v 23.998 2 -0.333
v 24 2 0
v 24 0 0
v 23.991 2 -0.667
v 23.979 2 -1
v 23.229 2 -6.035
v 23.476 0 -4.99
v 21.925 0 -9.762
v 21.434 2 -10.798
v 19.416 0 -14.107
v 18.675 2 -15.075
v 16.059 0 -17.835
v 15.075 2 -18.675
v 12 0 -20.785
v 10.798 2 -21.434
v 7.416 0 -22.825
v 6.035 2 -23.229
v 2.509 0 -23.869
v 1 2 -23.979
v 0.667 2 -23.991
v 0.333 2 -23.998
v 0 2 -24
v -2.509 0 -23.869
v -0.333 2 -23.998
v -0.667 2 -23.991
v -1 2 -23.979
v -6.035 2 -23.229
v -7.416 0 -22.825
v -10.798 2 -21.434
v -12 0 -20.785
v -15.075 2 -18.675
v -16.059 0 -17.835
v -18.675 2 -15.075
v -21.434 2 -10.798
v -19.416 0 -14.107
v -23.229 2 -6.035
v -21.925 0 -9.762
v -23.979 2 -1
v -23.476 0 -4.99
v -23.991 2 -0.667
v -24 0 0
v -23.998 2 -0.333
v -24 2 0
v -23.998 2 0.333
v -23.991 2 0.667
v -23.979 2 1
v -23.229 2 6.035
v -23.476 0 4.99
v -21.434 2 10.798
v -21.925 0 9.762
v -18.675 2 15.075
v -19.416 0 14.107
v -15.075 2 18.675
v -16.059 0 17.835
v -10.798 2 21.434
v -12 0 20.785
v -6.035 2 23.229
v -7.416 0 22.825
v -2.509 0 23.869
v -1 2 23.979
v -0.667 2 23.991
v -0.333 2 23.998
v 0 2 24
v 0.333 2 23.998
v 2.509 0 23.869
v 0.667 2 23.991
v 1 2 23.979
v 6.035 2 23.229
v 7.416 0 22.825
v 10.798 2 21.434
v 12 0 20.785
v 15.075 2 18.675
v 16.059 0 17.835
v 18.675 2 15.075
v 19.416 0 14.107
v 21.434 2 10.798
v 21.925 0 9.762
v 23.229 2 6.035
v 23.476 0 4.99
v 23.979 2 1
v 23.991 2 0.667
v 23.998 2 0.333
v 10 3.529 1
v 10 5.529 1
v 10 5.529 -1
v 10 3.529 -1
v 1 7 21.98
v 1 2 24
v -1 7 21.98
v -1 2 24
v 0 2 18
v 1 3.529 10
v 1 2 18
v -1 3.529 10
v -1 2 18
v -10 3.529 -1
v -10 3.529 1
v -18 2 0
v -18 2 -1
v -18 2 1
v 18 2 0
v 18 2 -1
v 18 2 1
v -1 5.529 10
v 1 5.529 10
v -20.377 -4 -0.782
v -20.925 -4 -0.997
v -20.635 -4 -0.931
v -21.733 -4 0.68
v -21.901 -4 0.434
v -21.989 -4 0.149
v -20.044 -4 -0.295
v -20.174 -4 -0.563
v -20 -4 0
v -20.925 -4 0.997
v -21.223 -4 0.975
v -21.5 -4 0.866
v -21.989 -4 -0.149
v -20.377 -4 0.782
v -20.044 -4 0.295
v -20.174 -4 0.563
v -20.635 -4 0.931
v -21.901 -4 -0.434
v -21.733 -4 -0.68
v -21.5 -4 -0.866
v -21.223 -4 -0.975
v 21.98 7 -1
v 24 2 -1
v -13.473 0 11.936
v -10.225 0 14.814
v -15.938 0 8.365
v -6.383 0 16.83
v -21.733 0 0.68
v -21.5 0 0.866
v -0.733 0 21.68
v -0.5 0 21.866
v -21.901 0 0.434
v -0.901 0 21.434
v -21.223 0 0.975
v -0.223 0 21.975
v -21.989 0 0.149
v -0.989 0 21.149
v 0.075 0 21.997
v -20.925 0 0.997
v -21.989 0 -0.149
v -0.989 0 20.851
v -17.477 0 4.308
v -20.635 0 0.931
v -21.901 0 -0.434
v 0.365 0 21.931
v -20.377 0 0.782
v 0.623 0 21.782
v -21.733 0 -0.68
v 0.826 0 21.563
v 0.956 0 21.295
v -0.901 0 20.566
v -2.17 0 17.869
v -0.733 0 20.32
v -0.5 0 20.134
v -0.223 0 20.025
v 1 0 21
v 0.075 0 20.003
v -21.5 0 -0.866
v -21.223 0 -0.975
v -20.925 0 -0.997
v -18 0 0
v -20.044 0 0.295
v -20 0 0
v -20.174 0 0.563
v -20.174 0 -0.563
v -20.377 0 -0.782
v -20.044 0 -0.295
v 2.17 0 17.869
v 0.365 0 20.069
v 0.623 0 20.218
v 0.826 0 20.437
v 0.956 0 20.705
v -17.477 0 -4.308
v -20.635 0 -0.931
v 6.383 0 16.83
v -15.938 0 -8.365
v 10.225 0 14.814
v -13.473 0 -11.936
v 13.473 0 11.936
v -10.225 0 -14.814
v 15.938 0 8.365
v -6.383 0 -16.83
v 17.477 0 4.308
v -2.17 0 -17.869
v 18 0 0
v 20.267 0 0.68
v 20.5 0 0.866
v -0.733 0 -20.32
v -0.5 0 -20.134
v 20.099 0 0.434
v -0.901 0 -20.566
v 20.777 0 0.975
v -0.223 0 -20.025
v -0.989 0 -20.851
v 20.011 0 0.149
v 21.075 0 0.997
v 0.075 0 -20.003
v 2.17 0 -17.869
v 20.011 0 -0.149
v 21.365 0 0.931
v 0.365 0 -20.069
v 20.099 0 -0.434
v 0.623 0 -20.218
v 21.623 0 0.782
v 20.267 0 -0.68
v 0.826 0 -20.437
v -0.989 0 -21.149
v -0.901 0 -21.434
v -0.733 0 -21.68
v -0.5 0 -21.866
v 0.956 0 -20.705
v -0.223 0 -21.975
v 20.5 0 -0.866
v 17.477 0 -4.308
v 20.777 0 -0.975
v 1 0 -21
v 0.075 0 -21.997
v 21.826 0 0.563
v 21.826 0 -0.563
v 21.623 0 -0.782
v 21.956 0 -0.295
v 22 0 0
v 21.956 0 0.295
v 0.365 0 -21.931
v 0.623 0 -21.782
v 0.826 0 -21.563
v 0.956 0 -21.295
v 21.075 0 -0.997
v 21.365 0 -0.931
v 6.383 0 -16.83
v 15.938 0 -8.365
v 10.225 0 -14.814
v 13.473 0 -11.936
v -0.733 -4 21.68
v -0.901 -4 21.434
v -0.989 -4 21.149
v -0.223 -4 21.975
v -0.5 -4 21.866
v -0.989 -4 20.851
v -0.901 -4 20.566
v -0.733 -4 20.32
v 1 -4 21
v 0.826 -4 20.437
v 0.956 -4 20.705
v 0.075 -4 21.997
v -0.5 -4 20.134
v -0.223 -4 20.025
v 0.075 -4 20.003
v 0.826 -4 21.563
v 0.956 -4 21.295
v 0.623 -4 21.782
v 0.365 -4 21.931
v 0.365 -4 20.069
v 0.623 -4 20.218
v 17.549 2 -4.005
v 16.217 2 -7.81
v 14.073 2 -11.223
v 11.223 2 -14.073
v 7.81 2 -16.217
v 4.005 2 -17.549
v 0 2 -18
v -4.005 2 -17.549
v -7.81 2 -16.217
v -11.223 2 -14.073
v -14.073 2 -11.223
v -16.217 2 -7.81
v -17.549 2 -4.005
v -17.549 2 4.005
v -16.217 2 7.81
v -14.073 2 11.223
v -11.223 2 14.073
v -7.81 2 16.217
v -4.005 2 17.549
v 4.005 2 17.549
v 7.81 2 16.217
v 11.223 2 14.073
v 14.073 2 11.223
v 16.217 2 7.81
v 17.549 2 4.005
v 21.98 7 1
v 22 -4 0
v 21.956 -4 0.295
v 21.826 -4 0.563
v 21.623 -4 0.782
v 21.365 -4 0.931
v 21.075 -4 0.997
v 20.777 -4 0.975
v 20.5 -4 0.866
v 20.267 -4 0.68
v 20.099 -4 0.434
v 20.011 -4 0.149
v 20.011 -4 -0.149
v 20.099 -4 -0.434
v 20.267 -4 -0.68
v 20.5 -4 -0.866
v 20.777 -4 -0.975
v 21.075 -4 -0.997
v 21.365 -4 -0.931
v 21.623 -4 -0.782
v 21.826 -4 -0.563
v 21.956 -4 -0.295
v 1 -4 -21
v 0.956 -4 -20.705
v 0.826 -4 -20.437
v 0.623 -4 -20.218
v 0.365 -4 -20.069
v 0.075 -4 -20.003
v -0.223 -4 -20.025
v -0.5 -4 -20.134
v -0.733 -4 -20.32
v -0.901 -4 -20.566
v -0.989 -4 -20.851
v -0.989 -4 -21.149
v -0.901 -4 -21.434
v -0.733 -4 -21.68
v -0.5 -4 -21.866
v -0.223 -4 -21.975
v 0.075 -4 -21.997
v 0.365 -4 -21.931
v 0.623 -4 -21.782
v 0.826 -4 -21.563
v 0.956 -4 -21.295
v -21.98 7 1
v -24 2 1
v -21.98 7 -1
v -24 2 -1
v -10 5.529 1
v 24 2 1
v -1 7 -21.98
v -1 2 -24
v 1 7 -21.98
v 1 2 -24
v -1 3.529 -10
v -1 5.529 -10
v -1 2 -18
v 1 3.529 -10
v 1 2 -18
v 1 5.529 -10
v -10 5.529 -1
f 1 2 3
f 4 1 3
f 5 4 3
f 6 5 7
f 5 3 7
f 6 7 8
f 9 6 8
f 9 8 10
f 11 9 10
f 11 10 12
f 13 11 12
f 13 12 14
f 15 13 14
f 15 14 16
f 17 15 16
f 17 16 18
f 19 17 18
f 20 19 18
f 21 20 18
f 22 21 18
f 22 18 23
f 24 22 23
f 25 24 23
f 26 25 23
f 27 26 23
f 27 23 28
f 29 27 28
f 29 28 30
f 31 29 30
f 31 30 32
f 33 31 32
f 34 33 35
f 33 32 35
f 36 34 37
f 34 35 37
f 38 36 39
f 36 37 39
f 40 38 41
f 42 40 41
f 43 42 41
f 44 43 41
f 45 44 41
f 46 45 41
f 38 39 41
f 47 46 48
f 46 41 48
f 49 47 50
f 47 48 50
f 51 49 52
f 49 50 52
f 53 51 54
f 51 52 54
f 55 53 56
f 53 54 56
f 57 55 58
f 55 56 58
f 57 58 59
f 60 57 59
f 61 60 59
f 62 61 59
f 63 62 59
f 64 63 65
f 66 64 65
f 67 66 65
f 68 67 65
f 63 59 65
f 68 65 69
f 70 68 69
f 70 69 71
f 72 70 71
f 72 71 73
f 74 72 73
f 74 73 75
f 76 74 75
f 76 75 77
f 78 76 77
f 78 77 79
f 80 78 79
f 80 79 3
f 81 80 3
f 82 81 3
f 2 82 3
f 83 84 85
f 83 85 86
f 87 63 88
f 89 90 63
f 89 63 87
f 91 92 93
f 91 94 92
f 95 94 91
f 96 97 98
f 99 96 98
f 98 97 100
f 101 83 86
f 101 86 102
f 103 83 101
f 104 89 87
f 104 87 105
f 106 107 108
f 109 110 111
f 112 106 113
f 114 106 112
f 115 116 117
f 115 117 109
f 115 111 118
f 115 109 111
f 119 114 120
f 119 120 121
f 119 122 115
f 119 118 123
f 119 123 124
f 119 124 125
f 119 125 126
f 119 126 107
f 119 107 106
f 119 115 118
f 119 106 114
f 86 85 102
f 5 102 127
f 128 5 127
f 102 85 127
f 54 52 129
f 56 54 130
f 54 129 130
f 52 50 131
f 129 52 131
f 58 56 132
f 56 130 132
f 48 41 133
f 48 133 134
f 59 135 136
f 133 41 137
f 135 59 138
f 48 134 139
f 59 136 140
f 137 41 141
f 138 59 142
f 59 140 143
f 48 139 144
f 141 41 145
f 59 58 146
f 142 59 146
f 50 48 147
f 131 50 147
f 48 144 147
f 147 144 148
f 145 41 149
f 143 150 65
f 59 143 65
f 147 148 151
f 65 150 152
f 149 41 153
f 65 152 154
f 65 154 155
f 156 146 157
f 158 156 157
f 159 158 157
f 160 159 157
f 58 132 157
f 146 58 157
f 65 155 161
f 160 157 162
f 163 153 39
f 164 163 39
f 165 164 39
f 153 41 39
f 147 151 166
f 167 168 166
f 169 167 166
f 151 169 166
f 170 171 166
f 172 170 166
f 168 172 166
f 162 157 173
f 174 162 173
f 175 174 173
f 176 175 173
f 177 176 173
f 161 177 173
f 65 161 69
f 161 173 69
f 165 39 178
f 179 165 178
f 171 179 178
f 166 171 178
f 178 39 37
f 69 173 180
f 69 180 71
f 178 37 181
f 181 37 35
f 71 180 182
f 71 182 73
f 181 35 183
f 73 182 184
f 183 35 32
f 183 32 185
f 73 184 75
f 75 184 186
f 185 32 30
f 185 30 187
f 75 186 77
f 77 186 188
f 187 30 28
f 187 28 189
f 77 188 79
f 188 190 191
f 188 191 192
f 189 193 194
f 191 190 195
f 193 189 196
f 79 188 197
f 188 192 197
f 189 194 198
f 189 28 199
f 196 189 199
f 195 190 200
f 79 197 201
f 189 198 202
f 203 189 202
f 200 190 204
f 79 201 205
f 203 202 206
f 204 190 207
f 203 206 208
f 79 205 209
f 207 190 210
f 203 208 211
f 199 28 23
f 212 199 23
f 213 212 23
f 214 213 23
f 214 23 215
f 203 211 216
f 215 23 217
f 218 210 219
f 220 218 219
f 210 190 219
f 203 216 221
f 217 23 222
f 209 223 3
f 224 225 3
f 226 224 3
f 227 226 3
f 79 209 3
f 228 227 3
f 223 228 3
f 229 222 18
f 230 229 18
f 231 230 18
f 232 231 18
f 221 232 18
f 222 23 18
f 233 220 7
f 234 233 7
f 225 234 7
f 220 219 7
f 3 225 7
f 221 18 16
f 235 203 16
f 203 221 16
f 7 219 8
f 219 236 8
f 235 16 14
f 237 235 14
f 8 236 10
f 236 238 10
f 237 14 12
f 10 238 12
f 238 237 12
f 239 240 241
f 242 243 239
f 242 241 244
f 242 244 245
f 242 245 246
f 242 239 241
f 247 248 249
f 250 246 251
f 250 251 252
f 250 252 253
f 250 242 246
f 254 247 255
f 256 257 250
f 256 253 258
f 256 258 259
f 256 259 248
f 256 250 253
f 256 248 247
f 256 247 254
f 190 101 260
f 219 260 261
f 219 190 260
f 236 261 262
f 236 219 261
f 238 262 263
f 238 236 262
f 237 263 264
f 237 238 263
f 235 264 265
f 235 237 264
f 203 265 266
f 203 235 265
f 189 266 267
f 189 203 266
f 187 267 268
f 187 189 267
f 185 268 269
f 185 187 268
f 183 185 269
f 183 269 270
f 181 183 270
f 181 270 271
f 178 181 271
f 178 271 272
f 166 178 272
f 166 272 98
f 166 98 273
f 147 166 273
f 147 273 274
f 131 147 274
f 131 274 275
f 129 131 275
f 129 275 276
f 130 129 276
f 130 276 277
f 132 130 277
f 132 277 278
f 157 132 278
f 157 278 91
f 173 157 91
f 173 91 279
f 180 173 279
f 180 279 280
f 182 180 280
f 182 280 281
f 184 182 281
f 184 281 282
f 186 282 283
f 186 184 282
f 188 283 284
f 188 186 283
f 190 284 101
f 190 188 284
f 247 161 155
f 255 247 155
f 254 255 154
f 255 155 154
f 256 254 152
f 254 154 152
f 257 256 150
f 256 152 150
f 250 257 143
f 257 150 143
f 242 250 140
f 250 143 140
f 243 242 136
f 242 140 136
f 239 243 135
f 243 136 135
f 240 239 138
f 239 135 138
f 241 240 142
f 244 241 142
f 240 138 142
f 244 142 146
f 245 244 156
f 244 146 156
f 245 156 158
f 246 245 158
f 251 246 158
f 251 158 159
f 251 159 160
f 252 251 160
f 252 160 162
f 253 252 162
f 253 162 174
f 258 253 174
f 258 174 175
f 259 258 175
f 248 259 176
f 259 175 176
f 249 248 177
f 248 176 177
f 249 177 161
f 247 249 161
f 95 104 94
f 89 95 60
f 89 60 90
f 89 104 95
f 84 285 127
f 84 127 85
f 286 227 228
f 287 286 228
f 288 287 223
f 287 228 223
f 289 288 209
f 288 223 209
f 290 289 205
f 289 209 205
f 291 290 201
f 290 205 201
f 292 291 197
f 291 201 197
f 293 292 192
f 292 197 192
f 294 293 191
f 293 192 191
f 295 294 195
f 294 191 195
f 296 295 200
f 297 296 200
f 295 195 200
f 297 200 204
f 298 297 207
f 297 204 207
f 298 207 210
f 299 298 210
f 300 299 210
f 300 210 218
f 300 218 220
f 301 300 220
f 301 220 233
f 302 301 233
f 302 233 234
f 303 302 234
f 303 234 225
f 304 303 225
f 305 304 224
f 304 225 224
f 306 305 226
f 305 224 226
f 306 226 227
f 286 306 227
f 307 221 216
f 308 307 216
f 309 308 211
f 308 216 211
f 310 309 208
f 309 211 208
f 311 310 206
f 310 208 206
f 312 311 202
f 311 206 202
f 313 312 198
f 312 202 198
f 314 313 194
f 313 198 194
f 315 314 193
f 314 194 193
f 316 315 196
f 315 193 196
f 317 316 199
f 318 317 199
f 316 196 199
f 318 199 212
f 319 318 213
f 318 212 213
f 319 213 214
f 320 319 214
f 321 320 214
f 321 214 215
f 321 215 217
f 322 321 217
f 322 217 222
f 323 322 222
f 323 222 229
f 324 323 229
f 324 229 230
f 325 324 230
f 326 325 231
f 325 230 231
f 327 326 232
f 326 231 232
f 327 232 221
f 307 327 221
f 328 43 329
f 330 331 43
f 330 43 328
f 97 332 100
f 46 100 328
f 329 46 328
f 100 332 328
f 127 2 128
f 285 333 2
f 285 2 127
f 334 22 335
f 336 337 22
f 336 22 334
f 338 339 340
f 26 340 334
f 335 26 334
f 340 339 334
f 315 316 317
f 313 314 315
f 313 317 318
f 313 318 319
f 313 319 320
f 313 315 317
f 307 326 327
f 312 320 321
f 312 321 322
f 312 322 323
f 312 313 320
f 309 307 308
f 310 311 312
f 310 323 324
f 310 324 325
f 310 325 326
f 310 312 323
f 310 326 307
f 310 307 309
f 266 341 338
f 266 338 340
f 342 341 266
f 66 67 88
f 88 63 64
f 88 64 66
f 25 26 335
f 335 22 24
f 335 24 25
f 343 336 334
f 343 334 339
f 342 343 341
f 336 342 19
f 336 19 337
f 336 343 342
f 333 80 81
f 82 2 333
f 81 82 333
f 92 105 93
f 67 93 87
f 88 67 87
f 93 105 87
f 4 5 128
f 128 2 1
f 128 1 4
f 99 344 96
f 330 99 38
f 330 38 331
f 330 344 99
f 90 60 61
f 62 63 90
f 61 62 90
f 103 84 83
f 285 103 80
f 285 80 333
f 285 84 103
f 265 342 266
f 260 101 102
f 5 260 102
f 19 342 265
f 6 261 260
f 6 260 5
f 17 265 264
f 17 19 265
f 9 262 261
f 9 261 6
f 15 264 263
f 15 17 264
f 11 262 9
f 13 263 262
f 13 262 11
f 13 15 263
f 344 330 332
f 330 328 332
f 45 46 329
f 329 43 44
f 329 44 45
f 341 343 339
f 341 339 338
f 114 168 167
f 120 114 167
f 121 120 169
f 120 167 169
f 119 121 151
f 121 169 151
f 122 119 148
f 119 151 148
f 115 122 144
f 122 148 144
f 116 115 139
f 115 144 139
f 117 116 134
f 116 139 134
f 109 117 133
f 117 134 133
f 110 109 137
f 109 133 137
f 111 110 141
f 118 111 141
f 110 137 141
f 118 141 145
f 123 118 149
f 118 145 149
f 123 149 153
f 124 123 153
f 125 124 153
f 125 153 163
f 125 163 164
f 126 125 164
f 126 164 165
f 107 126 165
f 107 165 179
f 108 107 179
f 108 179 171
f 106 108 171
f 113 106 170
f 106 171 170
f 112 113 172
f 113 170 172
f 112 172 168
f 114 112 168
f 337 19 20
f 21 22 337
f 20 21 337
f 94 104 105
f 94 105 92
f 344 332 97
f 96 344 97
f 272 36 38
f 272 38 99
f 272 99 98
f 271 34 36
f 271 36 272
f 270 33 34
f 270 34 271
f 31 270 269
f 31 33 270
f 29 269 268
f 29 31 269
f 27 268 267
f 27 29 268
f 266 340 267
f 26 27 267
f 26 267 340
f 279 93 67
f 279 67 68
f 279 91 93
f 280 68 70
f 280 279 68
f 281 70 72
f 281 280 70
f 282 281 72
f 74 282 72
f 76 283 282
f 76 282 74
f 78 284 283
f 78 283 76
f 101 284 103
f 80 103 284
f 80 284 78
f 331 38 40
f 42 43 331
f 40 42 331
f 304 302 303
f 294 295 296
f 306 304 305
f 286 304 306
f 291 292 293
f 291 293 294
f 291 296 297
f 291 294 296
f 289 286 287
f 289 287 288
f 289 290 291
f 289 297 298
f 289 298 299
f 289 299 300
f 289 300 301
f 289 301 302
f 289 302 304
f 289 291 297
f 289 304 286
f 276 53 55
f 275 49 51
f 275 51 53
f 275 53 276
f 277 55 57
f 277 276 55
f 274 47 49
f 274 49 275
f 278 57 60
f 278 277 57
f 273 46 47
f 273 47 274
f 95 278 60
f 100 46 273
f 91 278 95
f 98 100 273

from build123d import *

# Parameters (mm, degrees)
SKETCH1_R                = 24
SKETCH1_R_2              = 18
BOSS_EXTRUDE1_DEPTH      = 2
BOSS_EXTRUDE2_DEPTH      = 1
BOSS_EXTRUDE2_DEPTH_BACK = 1
BOSS_EXTRUDE3_DEPTH      = 1
BOSS_EXTRUDE3_DEPTH_BACK = 1
SKETCH5_R                = 1
BOSS_EXTRUDE4_DEPTH      = 4


with BuildPart() as part:
    # Sketch1 → Boss-Extrude1 (new body)
    with BuildSketch(Plane(origin=(0, 0, 0), x_dir=(1, 0, 0), z_dir=(0, 1, 0))):
        Circle(SKETCH1_R)
        Circle(SKETCH1_R_2, mode=Mode.SUBTRACT)
    extrude(amount=BOSS_EXTRUDE1_DEPTH)

    # Sketch3 → Boss-Extrude2 (add, two sides: drawn at the far end of the back side and taken through both)
    with BuildSketch(Plane.XY.offset(-BOSS_EXTRUDE2_DEPTH_BACK)):
        Polygon((24, 2), (21.979868871, 7), (10, 5.529057061), (10, 3.529057061), (18, 2), align=None)
        Polygon((-10, 3.529057061), (-18, 2), (-24, 2), (-21.979868871, 7), (-10, 5.529057061), align=None)
    extrude(amount=BOSS_EXTRUDE2_DEPTH + BOSS_EXTRUDE2_DEPTH_BACK)

    # Sketch4 → Boss-Extrude3 (add, two sides: drawn at the far end of the back side and taken through both)
    with BuildSketch(Plane(origin=(0, 0, 0), x_dir=(0, 0, -1), z_dir=(1, 0, 0)).offset(-BOSS_EXTRUDE3_DEPTH_BACK)):
        Polygon((24, 2), (21.979868871, 7), (10, 5.529057061), (10, 3.529057061), (18, 2), align=None)
        Polygon((-10, 3.529057061), (-18, 2), (-24, 2), (-21.979868871, 7), (-10, 5.529057061), align=None)
    extrude(amount=BOSS_EXTRUDE3_DEPTH + BOSS_EXTRUDE3_DEPTH_BACK)

    # Sketch5 → Boss-Extrude4 (add)
    with BuildSketch(Plane.XZ):
        with Locations((21, 0)):
            Circle(SKETCH5_R)
        with Locations((0, 21)):
            Circle(SKETCH5_R)
        with Locations((0, -21)):
            Circle(SKETCH5_R)
        with Locations((-21, 0)):
            Circle(SKETCH5_R)
    extrude(amount=BOSS_EXTRUDE4_DEPTH)


solid = part.part
